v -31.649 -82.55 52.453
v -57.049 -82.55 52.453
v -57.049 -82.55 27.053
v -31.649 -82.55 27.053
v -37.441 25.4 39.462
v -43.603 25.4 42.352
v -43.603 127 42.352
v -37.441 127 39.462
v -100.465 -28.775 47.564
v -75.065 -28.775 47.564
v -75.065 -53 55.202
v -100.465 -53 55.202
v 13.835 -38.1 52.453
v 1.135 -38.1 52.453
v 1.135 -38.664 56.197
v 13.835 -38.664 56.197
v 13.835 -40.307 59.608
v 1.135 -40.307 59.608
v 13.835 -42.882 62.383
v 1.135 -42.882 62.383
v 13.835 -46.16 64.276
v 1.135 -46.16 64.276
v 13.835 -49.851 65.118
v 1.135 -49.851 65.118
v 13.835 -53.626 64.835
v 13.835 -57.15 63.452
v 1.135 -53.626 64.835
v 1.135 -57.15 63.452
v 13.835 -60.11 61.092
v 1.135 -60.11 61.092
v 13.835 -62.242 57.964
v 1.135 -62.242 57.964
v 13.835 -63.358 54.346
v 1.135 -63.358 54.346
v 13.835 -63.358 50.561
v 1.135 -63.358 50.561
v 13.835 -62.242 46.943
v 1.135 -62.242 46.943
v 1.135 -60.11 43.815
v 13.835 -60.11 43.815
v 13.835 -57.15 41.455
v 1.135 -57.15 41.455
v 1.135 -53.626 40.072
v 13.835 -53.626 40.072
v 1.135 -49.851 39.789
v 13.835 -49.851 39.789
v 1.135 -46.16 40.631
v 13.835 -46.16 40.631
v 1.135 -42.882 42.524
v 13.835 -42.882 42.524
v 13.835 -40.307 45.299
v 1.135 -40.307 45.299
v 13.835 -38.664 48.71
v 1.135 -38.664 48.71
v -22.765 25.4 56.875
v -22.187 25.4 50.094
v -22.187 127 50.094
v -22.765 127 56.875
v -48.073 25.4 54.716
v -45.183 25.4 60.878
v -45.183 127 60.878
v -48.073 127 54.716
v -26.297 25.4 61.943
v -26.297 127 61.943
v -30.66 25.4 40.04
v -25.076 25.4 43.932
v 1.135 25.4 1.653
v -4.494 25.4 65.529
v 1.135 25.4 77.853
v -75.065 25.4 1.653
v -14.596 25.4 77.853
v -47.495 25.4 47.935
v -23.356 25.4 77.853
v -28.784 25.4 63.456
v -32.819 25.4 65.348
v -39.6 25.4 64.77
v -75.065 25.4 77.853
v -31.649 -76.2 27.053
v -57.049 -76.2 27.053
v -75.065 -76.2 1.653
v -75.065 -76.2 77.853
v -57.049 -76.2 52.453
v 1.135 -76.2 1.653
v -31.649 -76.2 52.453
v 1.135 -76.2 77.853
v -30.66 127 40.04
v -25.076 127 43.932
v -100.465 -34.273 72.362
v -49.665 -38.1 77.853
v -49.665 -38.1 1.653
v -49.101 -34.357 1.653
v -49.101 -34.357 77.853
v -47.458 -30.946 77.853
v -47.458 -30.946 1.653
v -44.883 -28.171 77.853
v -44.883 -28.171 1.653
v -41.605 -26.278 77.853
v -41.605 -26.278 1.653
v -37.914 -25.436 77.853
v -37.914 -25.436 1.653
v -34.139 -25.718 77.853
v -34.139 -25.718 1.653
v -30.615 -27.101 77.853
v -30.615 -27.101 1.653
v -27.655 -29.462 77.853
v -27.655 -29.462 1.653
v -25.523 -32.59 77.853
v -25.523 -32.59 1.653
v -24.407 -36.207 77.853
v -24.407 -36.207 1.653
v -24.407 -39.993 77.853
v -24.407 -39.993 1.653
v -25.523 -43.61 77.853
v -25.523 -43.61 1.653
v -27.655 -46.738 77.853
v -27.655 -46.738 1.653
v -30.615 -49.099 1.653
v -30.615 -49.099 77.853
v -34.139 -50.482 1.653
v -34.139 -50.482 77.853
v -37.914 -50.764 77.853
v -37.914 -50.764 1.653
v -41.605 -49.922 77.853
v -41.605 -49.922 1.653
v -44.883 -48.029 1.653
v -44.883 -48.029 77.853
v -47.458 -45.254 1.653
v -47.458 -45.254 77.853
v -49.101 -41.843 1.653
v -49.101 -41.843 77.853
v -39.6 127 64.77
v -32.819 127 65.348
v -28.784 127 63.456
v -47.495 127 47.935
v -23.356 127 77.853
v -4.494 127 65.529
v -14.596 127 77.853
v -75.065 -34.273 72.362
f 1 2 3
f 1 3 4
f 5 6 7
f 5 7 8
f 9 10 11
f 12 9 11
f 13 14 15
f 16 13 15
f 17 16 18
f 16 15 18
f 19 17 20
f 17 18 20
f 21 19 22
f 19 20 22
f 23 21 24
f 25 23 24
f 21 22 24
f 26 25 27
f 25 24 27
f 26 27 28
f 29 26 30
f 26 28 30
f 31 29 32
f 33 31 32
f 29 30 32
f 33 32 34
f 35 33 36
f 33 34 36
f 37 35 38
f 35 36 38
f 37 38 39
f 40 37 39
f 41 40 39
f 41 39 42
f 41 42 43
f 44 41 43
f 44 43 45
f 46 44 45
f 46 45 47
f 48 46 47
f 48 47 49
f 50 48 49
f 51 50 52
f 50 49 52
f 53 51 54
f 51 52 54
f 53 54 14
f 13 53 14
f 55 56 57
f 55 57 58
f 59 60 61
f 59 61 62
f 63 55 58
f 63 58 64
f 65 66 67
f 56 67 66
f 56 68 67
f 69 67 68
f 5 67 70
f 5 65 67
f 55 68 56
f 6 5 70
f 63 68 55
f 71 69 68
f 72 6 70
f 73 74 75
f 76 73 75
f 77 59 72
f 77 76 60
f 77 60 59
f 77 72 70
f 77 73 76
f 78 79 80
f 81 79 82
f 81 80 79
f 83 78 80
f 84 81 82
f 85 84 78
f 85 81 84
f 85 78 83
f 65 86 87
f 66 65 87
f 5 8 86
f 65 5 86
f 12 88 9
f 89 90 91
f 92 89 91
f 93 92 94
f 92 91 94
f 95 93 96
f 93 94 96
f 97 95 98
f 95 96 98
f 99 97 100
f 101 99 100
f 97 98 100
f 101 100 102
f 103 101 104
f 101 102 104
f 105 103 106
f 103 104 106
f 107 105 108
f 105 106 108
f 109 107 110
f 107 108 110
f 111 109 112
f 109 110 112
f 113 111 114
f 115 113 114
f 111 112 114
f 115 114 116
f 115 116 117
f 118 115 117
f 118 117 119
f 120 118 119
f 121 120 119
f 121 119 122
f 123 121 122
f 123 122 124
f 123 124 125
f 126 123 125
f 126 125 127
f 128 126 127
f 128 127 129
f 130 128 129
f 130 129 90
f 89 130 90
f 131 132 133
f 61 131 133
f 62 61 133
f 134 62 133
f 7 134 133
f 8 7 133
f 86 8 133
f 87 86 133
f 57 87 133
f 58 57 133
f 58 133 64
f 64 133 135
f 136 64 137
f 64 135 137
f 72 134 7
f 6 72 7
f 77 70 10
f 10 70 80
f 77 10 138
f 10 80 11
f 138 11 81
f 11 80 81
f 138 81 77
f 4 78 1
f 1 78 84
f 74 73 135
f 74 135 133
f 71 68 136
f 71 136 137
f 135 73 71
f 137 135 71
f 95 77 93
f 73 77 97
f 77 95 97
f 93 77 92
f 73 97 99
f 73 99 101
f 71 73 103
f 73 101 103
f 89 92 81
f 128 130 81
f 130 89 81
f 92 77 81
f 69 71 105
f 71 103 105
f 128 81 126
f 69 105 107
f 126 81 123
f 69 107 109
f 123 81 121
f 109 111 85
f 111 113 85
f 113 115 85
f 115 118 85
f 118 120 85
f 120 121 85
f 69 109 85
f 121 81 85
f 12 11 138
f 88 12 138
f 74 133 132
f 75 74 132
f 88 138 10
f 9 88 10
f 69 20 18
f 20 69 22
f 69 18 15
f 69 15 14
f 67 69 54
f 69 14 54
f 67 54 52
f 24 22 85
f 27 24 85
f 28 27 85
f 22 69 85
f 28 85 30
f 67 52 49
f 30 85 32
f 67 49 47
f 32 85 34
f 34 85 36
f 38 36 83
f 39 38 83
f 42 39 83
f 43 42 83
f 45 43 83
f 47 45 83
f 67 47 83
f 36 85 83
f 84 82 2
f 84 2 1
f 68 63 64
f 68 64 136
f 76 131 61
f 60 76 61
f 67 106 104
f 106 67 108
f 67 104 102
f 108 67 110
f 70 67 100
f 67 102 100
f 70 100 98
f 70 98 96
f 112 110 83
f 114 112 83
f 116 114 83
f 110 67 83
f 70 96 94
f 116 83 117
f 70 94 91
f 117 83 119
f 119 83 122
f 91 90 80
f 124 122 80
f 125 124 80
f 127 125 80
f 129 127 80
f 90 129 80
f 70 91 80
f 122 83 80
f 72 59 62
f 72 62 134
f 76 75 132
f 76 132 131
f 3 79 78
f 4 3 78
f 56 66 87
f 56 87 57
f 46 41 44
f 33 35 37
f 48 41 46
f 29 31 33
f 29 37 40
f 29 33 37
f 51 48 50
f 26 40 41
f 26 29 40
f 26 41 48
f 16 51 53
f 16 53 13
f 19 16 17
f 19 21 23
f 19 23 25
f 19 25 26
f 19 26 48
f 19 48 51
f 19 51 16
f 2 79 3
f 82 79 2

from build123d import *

# Parameters (mm, degrees)
F0_W      = 76.2
F0_H      = 76.2
F1_DEPTH  = 76.2
F2_W      = 25.4
F2_H      = 25.4
F3_DEPTH  = 6.35
F4_R      = 12.7
F5_DEPTH  = 12.7
F7_D      = 25.4
F9_DEPTH  = 25.4
F11_DEPTH = 25.4
F12_DEPTH = 127


with BuildPart() as f1:
    # F0 (on Front) → F1 (new body)
    with BuildSketch(Plane.XZ):
        with Locations((-36.9649222121, 39.7534392561)):
            Rectangle(F0_W, F0_H)
    extrude(amount=F1_DEPTH)

    # F2 (on face) → F3 (join)
    with BuildSketch(Plane.XZ.offset(76.2)):
        with Locations((-44.3486804143, 39.7534392561)):
            Rectangle(F2_W, F2_H)
    extrude(amount=F3_DEPTH)

    # F4 (on face) → F5 (join)
    with BuildSketch(Plane.YZ.offset(1.1350777879)):
        with Locations((-50.8, 52.4534392561)):
            Circle(F4_R)
    extrude(amount=F5_DEPTH)

    # F7 (through all)
    with Locations(Plane.XY.offset(77.8534392561)):
        with Locations((-36.9649222121, -38.1)):
            Hole(F7_D / 2)

    # F8 (on face) → F9 (join)
    with BuildSketch(Plane(origin=(-75.0649222121, 0, 0), x_dir=(0, -1, 0), z_dir=(-1, 0, 0))):
        Polygon((28.7754268733, 47.5637023159), (52.9997243198, 55.2019883295), (34.2726258674, 72.3617023001), align=None)
    extrude(amount=F9_DEPTH)

    # F10 (on face) → F11 (join)
    with BuildSketch(Plane(origin=(0, 0, 0), x_dir=(-1, 0, 0), z_dir=(0, 1, 0))):
        Polygon((48.0731389709, 54.716393042), (47.494721, 47.9351072785), (43.6031534613, 42.3515505225), (37.4411787343, 39.4618322976), (30.6598929708, 40.0402502686), (25.0763362148, 43.9318178073), (22.1866179899, 50.0937925343), (22.7650359609, 56.8750782978), (26.2971690254, 61.9429244137), (4.4938835457, 65.529052283), (14.595719446, 77.8534392561), (-1.1350777879, 77.8534392561), (-1.1350777879, 1.6534392561), (75.0649222121, 1.6534392561), (75.0649222121, 77.8534392561), (23.3556207336, 77.8534392561), (28.7842644927, 63.4564224548), (32.8185782266, 65.3483532786), (39.5998639901, 64.7699353076), (45.1834207461, 60.878367769), align=None)
    extrude(amount=F11_DEPTH)

    # F12 (add): a face of the model
    f12_faces = [f1.faces().sort_by_distance(p)[0] for p in [
        (-29.6209638301, 0, 57.8915936643),
    ]]
    extrude(f12_faces, amount=F12_DEPTH)


solid = f1.part
